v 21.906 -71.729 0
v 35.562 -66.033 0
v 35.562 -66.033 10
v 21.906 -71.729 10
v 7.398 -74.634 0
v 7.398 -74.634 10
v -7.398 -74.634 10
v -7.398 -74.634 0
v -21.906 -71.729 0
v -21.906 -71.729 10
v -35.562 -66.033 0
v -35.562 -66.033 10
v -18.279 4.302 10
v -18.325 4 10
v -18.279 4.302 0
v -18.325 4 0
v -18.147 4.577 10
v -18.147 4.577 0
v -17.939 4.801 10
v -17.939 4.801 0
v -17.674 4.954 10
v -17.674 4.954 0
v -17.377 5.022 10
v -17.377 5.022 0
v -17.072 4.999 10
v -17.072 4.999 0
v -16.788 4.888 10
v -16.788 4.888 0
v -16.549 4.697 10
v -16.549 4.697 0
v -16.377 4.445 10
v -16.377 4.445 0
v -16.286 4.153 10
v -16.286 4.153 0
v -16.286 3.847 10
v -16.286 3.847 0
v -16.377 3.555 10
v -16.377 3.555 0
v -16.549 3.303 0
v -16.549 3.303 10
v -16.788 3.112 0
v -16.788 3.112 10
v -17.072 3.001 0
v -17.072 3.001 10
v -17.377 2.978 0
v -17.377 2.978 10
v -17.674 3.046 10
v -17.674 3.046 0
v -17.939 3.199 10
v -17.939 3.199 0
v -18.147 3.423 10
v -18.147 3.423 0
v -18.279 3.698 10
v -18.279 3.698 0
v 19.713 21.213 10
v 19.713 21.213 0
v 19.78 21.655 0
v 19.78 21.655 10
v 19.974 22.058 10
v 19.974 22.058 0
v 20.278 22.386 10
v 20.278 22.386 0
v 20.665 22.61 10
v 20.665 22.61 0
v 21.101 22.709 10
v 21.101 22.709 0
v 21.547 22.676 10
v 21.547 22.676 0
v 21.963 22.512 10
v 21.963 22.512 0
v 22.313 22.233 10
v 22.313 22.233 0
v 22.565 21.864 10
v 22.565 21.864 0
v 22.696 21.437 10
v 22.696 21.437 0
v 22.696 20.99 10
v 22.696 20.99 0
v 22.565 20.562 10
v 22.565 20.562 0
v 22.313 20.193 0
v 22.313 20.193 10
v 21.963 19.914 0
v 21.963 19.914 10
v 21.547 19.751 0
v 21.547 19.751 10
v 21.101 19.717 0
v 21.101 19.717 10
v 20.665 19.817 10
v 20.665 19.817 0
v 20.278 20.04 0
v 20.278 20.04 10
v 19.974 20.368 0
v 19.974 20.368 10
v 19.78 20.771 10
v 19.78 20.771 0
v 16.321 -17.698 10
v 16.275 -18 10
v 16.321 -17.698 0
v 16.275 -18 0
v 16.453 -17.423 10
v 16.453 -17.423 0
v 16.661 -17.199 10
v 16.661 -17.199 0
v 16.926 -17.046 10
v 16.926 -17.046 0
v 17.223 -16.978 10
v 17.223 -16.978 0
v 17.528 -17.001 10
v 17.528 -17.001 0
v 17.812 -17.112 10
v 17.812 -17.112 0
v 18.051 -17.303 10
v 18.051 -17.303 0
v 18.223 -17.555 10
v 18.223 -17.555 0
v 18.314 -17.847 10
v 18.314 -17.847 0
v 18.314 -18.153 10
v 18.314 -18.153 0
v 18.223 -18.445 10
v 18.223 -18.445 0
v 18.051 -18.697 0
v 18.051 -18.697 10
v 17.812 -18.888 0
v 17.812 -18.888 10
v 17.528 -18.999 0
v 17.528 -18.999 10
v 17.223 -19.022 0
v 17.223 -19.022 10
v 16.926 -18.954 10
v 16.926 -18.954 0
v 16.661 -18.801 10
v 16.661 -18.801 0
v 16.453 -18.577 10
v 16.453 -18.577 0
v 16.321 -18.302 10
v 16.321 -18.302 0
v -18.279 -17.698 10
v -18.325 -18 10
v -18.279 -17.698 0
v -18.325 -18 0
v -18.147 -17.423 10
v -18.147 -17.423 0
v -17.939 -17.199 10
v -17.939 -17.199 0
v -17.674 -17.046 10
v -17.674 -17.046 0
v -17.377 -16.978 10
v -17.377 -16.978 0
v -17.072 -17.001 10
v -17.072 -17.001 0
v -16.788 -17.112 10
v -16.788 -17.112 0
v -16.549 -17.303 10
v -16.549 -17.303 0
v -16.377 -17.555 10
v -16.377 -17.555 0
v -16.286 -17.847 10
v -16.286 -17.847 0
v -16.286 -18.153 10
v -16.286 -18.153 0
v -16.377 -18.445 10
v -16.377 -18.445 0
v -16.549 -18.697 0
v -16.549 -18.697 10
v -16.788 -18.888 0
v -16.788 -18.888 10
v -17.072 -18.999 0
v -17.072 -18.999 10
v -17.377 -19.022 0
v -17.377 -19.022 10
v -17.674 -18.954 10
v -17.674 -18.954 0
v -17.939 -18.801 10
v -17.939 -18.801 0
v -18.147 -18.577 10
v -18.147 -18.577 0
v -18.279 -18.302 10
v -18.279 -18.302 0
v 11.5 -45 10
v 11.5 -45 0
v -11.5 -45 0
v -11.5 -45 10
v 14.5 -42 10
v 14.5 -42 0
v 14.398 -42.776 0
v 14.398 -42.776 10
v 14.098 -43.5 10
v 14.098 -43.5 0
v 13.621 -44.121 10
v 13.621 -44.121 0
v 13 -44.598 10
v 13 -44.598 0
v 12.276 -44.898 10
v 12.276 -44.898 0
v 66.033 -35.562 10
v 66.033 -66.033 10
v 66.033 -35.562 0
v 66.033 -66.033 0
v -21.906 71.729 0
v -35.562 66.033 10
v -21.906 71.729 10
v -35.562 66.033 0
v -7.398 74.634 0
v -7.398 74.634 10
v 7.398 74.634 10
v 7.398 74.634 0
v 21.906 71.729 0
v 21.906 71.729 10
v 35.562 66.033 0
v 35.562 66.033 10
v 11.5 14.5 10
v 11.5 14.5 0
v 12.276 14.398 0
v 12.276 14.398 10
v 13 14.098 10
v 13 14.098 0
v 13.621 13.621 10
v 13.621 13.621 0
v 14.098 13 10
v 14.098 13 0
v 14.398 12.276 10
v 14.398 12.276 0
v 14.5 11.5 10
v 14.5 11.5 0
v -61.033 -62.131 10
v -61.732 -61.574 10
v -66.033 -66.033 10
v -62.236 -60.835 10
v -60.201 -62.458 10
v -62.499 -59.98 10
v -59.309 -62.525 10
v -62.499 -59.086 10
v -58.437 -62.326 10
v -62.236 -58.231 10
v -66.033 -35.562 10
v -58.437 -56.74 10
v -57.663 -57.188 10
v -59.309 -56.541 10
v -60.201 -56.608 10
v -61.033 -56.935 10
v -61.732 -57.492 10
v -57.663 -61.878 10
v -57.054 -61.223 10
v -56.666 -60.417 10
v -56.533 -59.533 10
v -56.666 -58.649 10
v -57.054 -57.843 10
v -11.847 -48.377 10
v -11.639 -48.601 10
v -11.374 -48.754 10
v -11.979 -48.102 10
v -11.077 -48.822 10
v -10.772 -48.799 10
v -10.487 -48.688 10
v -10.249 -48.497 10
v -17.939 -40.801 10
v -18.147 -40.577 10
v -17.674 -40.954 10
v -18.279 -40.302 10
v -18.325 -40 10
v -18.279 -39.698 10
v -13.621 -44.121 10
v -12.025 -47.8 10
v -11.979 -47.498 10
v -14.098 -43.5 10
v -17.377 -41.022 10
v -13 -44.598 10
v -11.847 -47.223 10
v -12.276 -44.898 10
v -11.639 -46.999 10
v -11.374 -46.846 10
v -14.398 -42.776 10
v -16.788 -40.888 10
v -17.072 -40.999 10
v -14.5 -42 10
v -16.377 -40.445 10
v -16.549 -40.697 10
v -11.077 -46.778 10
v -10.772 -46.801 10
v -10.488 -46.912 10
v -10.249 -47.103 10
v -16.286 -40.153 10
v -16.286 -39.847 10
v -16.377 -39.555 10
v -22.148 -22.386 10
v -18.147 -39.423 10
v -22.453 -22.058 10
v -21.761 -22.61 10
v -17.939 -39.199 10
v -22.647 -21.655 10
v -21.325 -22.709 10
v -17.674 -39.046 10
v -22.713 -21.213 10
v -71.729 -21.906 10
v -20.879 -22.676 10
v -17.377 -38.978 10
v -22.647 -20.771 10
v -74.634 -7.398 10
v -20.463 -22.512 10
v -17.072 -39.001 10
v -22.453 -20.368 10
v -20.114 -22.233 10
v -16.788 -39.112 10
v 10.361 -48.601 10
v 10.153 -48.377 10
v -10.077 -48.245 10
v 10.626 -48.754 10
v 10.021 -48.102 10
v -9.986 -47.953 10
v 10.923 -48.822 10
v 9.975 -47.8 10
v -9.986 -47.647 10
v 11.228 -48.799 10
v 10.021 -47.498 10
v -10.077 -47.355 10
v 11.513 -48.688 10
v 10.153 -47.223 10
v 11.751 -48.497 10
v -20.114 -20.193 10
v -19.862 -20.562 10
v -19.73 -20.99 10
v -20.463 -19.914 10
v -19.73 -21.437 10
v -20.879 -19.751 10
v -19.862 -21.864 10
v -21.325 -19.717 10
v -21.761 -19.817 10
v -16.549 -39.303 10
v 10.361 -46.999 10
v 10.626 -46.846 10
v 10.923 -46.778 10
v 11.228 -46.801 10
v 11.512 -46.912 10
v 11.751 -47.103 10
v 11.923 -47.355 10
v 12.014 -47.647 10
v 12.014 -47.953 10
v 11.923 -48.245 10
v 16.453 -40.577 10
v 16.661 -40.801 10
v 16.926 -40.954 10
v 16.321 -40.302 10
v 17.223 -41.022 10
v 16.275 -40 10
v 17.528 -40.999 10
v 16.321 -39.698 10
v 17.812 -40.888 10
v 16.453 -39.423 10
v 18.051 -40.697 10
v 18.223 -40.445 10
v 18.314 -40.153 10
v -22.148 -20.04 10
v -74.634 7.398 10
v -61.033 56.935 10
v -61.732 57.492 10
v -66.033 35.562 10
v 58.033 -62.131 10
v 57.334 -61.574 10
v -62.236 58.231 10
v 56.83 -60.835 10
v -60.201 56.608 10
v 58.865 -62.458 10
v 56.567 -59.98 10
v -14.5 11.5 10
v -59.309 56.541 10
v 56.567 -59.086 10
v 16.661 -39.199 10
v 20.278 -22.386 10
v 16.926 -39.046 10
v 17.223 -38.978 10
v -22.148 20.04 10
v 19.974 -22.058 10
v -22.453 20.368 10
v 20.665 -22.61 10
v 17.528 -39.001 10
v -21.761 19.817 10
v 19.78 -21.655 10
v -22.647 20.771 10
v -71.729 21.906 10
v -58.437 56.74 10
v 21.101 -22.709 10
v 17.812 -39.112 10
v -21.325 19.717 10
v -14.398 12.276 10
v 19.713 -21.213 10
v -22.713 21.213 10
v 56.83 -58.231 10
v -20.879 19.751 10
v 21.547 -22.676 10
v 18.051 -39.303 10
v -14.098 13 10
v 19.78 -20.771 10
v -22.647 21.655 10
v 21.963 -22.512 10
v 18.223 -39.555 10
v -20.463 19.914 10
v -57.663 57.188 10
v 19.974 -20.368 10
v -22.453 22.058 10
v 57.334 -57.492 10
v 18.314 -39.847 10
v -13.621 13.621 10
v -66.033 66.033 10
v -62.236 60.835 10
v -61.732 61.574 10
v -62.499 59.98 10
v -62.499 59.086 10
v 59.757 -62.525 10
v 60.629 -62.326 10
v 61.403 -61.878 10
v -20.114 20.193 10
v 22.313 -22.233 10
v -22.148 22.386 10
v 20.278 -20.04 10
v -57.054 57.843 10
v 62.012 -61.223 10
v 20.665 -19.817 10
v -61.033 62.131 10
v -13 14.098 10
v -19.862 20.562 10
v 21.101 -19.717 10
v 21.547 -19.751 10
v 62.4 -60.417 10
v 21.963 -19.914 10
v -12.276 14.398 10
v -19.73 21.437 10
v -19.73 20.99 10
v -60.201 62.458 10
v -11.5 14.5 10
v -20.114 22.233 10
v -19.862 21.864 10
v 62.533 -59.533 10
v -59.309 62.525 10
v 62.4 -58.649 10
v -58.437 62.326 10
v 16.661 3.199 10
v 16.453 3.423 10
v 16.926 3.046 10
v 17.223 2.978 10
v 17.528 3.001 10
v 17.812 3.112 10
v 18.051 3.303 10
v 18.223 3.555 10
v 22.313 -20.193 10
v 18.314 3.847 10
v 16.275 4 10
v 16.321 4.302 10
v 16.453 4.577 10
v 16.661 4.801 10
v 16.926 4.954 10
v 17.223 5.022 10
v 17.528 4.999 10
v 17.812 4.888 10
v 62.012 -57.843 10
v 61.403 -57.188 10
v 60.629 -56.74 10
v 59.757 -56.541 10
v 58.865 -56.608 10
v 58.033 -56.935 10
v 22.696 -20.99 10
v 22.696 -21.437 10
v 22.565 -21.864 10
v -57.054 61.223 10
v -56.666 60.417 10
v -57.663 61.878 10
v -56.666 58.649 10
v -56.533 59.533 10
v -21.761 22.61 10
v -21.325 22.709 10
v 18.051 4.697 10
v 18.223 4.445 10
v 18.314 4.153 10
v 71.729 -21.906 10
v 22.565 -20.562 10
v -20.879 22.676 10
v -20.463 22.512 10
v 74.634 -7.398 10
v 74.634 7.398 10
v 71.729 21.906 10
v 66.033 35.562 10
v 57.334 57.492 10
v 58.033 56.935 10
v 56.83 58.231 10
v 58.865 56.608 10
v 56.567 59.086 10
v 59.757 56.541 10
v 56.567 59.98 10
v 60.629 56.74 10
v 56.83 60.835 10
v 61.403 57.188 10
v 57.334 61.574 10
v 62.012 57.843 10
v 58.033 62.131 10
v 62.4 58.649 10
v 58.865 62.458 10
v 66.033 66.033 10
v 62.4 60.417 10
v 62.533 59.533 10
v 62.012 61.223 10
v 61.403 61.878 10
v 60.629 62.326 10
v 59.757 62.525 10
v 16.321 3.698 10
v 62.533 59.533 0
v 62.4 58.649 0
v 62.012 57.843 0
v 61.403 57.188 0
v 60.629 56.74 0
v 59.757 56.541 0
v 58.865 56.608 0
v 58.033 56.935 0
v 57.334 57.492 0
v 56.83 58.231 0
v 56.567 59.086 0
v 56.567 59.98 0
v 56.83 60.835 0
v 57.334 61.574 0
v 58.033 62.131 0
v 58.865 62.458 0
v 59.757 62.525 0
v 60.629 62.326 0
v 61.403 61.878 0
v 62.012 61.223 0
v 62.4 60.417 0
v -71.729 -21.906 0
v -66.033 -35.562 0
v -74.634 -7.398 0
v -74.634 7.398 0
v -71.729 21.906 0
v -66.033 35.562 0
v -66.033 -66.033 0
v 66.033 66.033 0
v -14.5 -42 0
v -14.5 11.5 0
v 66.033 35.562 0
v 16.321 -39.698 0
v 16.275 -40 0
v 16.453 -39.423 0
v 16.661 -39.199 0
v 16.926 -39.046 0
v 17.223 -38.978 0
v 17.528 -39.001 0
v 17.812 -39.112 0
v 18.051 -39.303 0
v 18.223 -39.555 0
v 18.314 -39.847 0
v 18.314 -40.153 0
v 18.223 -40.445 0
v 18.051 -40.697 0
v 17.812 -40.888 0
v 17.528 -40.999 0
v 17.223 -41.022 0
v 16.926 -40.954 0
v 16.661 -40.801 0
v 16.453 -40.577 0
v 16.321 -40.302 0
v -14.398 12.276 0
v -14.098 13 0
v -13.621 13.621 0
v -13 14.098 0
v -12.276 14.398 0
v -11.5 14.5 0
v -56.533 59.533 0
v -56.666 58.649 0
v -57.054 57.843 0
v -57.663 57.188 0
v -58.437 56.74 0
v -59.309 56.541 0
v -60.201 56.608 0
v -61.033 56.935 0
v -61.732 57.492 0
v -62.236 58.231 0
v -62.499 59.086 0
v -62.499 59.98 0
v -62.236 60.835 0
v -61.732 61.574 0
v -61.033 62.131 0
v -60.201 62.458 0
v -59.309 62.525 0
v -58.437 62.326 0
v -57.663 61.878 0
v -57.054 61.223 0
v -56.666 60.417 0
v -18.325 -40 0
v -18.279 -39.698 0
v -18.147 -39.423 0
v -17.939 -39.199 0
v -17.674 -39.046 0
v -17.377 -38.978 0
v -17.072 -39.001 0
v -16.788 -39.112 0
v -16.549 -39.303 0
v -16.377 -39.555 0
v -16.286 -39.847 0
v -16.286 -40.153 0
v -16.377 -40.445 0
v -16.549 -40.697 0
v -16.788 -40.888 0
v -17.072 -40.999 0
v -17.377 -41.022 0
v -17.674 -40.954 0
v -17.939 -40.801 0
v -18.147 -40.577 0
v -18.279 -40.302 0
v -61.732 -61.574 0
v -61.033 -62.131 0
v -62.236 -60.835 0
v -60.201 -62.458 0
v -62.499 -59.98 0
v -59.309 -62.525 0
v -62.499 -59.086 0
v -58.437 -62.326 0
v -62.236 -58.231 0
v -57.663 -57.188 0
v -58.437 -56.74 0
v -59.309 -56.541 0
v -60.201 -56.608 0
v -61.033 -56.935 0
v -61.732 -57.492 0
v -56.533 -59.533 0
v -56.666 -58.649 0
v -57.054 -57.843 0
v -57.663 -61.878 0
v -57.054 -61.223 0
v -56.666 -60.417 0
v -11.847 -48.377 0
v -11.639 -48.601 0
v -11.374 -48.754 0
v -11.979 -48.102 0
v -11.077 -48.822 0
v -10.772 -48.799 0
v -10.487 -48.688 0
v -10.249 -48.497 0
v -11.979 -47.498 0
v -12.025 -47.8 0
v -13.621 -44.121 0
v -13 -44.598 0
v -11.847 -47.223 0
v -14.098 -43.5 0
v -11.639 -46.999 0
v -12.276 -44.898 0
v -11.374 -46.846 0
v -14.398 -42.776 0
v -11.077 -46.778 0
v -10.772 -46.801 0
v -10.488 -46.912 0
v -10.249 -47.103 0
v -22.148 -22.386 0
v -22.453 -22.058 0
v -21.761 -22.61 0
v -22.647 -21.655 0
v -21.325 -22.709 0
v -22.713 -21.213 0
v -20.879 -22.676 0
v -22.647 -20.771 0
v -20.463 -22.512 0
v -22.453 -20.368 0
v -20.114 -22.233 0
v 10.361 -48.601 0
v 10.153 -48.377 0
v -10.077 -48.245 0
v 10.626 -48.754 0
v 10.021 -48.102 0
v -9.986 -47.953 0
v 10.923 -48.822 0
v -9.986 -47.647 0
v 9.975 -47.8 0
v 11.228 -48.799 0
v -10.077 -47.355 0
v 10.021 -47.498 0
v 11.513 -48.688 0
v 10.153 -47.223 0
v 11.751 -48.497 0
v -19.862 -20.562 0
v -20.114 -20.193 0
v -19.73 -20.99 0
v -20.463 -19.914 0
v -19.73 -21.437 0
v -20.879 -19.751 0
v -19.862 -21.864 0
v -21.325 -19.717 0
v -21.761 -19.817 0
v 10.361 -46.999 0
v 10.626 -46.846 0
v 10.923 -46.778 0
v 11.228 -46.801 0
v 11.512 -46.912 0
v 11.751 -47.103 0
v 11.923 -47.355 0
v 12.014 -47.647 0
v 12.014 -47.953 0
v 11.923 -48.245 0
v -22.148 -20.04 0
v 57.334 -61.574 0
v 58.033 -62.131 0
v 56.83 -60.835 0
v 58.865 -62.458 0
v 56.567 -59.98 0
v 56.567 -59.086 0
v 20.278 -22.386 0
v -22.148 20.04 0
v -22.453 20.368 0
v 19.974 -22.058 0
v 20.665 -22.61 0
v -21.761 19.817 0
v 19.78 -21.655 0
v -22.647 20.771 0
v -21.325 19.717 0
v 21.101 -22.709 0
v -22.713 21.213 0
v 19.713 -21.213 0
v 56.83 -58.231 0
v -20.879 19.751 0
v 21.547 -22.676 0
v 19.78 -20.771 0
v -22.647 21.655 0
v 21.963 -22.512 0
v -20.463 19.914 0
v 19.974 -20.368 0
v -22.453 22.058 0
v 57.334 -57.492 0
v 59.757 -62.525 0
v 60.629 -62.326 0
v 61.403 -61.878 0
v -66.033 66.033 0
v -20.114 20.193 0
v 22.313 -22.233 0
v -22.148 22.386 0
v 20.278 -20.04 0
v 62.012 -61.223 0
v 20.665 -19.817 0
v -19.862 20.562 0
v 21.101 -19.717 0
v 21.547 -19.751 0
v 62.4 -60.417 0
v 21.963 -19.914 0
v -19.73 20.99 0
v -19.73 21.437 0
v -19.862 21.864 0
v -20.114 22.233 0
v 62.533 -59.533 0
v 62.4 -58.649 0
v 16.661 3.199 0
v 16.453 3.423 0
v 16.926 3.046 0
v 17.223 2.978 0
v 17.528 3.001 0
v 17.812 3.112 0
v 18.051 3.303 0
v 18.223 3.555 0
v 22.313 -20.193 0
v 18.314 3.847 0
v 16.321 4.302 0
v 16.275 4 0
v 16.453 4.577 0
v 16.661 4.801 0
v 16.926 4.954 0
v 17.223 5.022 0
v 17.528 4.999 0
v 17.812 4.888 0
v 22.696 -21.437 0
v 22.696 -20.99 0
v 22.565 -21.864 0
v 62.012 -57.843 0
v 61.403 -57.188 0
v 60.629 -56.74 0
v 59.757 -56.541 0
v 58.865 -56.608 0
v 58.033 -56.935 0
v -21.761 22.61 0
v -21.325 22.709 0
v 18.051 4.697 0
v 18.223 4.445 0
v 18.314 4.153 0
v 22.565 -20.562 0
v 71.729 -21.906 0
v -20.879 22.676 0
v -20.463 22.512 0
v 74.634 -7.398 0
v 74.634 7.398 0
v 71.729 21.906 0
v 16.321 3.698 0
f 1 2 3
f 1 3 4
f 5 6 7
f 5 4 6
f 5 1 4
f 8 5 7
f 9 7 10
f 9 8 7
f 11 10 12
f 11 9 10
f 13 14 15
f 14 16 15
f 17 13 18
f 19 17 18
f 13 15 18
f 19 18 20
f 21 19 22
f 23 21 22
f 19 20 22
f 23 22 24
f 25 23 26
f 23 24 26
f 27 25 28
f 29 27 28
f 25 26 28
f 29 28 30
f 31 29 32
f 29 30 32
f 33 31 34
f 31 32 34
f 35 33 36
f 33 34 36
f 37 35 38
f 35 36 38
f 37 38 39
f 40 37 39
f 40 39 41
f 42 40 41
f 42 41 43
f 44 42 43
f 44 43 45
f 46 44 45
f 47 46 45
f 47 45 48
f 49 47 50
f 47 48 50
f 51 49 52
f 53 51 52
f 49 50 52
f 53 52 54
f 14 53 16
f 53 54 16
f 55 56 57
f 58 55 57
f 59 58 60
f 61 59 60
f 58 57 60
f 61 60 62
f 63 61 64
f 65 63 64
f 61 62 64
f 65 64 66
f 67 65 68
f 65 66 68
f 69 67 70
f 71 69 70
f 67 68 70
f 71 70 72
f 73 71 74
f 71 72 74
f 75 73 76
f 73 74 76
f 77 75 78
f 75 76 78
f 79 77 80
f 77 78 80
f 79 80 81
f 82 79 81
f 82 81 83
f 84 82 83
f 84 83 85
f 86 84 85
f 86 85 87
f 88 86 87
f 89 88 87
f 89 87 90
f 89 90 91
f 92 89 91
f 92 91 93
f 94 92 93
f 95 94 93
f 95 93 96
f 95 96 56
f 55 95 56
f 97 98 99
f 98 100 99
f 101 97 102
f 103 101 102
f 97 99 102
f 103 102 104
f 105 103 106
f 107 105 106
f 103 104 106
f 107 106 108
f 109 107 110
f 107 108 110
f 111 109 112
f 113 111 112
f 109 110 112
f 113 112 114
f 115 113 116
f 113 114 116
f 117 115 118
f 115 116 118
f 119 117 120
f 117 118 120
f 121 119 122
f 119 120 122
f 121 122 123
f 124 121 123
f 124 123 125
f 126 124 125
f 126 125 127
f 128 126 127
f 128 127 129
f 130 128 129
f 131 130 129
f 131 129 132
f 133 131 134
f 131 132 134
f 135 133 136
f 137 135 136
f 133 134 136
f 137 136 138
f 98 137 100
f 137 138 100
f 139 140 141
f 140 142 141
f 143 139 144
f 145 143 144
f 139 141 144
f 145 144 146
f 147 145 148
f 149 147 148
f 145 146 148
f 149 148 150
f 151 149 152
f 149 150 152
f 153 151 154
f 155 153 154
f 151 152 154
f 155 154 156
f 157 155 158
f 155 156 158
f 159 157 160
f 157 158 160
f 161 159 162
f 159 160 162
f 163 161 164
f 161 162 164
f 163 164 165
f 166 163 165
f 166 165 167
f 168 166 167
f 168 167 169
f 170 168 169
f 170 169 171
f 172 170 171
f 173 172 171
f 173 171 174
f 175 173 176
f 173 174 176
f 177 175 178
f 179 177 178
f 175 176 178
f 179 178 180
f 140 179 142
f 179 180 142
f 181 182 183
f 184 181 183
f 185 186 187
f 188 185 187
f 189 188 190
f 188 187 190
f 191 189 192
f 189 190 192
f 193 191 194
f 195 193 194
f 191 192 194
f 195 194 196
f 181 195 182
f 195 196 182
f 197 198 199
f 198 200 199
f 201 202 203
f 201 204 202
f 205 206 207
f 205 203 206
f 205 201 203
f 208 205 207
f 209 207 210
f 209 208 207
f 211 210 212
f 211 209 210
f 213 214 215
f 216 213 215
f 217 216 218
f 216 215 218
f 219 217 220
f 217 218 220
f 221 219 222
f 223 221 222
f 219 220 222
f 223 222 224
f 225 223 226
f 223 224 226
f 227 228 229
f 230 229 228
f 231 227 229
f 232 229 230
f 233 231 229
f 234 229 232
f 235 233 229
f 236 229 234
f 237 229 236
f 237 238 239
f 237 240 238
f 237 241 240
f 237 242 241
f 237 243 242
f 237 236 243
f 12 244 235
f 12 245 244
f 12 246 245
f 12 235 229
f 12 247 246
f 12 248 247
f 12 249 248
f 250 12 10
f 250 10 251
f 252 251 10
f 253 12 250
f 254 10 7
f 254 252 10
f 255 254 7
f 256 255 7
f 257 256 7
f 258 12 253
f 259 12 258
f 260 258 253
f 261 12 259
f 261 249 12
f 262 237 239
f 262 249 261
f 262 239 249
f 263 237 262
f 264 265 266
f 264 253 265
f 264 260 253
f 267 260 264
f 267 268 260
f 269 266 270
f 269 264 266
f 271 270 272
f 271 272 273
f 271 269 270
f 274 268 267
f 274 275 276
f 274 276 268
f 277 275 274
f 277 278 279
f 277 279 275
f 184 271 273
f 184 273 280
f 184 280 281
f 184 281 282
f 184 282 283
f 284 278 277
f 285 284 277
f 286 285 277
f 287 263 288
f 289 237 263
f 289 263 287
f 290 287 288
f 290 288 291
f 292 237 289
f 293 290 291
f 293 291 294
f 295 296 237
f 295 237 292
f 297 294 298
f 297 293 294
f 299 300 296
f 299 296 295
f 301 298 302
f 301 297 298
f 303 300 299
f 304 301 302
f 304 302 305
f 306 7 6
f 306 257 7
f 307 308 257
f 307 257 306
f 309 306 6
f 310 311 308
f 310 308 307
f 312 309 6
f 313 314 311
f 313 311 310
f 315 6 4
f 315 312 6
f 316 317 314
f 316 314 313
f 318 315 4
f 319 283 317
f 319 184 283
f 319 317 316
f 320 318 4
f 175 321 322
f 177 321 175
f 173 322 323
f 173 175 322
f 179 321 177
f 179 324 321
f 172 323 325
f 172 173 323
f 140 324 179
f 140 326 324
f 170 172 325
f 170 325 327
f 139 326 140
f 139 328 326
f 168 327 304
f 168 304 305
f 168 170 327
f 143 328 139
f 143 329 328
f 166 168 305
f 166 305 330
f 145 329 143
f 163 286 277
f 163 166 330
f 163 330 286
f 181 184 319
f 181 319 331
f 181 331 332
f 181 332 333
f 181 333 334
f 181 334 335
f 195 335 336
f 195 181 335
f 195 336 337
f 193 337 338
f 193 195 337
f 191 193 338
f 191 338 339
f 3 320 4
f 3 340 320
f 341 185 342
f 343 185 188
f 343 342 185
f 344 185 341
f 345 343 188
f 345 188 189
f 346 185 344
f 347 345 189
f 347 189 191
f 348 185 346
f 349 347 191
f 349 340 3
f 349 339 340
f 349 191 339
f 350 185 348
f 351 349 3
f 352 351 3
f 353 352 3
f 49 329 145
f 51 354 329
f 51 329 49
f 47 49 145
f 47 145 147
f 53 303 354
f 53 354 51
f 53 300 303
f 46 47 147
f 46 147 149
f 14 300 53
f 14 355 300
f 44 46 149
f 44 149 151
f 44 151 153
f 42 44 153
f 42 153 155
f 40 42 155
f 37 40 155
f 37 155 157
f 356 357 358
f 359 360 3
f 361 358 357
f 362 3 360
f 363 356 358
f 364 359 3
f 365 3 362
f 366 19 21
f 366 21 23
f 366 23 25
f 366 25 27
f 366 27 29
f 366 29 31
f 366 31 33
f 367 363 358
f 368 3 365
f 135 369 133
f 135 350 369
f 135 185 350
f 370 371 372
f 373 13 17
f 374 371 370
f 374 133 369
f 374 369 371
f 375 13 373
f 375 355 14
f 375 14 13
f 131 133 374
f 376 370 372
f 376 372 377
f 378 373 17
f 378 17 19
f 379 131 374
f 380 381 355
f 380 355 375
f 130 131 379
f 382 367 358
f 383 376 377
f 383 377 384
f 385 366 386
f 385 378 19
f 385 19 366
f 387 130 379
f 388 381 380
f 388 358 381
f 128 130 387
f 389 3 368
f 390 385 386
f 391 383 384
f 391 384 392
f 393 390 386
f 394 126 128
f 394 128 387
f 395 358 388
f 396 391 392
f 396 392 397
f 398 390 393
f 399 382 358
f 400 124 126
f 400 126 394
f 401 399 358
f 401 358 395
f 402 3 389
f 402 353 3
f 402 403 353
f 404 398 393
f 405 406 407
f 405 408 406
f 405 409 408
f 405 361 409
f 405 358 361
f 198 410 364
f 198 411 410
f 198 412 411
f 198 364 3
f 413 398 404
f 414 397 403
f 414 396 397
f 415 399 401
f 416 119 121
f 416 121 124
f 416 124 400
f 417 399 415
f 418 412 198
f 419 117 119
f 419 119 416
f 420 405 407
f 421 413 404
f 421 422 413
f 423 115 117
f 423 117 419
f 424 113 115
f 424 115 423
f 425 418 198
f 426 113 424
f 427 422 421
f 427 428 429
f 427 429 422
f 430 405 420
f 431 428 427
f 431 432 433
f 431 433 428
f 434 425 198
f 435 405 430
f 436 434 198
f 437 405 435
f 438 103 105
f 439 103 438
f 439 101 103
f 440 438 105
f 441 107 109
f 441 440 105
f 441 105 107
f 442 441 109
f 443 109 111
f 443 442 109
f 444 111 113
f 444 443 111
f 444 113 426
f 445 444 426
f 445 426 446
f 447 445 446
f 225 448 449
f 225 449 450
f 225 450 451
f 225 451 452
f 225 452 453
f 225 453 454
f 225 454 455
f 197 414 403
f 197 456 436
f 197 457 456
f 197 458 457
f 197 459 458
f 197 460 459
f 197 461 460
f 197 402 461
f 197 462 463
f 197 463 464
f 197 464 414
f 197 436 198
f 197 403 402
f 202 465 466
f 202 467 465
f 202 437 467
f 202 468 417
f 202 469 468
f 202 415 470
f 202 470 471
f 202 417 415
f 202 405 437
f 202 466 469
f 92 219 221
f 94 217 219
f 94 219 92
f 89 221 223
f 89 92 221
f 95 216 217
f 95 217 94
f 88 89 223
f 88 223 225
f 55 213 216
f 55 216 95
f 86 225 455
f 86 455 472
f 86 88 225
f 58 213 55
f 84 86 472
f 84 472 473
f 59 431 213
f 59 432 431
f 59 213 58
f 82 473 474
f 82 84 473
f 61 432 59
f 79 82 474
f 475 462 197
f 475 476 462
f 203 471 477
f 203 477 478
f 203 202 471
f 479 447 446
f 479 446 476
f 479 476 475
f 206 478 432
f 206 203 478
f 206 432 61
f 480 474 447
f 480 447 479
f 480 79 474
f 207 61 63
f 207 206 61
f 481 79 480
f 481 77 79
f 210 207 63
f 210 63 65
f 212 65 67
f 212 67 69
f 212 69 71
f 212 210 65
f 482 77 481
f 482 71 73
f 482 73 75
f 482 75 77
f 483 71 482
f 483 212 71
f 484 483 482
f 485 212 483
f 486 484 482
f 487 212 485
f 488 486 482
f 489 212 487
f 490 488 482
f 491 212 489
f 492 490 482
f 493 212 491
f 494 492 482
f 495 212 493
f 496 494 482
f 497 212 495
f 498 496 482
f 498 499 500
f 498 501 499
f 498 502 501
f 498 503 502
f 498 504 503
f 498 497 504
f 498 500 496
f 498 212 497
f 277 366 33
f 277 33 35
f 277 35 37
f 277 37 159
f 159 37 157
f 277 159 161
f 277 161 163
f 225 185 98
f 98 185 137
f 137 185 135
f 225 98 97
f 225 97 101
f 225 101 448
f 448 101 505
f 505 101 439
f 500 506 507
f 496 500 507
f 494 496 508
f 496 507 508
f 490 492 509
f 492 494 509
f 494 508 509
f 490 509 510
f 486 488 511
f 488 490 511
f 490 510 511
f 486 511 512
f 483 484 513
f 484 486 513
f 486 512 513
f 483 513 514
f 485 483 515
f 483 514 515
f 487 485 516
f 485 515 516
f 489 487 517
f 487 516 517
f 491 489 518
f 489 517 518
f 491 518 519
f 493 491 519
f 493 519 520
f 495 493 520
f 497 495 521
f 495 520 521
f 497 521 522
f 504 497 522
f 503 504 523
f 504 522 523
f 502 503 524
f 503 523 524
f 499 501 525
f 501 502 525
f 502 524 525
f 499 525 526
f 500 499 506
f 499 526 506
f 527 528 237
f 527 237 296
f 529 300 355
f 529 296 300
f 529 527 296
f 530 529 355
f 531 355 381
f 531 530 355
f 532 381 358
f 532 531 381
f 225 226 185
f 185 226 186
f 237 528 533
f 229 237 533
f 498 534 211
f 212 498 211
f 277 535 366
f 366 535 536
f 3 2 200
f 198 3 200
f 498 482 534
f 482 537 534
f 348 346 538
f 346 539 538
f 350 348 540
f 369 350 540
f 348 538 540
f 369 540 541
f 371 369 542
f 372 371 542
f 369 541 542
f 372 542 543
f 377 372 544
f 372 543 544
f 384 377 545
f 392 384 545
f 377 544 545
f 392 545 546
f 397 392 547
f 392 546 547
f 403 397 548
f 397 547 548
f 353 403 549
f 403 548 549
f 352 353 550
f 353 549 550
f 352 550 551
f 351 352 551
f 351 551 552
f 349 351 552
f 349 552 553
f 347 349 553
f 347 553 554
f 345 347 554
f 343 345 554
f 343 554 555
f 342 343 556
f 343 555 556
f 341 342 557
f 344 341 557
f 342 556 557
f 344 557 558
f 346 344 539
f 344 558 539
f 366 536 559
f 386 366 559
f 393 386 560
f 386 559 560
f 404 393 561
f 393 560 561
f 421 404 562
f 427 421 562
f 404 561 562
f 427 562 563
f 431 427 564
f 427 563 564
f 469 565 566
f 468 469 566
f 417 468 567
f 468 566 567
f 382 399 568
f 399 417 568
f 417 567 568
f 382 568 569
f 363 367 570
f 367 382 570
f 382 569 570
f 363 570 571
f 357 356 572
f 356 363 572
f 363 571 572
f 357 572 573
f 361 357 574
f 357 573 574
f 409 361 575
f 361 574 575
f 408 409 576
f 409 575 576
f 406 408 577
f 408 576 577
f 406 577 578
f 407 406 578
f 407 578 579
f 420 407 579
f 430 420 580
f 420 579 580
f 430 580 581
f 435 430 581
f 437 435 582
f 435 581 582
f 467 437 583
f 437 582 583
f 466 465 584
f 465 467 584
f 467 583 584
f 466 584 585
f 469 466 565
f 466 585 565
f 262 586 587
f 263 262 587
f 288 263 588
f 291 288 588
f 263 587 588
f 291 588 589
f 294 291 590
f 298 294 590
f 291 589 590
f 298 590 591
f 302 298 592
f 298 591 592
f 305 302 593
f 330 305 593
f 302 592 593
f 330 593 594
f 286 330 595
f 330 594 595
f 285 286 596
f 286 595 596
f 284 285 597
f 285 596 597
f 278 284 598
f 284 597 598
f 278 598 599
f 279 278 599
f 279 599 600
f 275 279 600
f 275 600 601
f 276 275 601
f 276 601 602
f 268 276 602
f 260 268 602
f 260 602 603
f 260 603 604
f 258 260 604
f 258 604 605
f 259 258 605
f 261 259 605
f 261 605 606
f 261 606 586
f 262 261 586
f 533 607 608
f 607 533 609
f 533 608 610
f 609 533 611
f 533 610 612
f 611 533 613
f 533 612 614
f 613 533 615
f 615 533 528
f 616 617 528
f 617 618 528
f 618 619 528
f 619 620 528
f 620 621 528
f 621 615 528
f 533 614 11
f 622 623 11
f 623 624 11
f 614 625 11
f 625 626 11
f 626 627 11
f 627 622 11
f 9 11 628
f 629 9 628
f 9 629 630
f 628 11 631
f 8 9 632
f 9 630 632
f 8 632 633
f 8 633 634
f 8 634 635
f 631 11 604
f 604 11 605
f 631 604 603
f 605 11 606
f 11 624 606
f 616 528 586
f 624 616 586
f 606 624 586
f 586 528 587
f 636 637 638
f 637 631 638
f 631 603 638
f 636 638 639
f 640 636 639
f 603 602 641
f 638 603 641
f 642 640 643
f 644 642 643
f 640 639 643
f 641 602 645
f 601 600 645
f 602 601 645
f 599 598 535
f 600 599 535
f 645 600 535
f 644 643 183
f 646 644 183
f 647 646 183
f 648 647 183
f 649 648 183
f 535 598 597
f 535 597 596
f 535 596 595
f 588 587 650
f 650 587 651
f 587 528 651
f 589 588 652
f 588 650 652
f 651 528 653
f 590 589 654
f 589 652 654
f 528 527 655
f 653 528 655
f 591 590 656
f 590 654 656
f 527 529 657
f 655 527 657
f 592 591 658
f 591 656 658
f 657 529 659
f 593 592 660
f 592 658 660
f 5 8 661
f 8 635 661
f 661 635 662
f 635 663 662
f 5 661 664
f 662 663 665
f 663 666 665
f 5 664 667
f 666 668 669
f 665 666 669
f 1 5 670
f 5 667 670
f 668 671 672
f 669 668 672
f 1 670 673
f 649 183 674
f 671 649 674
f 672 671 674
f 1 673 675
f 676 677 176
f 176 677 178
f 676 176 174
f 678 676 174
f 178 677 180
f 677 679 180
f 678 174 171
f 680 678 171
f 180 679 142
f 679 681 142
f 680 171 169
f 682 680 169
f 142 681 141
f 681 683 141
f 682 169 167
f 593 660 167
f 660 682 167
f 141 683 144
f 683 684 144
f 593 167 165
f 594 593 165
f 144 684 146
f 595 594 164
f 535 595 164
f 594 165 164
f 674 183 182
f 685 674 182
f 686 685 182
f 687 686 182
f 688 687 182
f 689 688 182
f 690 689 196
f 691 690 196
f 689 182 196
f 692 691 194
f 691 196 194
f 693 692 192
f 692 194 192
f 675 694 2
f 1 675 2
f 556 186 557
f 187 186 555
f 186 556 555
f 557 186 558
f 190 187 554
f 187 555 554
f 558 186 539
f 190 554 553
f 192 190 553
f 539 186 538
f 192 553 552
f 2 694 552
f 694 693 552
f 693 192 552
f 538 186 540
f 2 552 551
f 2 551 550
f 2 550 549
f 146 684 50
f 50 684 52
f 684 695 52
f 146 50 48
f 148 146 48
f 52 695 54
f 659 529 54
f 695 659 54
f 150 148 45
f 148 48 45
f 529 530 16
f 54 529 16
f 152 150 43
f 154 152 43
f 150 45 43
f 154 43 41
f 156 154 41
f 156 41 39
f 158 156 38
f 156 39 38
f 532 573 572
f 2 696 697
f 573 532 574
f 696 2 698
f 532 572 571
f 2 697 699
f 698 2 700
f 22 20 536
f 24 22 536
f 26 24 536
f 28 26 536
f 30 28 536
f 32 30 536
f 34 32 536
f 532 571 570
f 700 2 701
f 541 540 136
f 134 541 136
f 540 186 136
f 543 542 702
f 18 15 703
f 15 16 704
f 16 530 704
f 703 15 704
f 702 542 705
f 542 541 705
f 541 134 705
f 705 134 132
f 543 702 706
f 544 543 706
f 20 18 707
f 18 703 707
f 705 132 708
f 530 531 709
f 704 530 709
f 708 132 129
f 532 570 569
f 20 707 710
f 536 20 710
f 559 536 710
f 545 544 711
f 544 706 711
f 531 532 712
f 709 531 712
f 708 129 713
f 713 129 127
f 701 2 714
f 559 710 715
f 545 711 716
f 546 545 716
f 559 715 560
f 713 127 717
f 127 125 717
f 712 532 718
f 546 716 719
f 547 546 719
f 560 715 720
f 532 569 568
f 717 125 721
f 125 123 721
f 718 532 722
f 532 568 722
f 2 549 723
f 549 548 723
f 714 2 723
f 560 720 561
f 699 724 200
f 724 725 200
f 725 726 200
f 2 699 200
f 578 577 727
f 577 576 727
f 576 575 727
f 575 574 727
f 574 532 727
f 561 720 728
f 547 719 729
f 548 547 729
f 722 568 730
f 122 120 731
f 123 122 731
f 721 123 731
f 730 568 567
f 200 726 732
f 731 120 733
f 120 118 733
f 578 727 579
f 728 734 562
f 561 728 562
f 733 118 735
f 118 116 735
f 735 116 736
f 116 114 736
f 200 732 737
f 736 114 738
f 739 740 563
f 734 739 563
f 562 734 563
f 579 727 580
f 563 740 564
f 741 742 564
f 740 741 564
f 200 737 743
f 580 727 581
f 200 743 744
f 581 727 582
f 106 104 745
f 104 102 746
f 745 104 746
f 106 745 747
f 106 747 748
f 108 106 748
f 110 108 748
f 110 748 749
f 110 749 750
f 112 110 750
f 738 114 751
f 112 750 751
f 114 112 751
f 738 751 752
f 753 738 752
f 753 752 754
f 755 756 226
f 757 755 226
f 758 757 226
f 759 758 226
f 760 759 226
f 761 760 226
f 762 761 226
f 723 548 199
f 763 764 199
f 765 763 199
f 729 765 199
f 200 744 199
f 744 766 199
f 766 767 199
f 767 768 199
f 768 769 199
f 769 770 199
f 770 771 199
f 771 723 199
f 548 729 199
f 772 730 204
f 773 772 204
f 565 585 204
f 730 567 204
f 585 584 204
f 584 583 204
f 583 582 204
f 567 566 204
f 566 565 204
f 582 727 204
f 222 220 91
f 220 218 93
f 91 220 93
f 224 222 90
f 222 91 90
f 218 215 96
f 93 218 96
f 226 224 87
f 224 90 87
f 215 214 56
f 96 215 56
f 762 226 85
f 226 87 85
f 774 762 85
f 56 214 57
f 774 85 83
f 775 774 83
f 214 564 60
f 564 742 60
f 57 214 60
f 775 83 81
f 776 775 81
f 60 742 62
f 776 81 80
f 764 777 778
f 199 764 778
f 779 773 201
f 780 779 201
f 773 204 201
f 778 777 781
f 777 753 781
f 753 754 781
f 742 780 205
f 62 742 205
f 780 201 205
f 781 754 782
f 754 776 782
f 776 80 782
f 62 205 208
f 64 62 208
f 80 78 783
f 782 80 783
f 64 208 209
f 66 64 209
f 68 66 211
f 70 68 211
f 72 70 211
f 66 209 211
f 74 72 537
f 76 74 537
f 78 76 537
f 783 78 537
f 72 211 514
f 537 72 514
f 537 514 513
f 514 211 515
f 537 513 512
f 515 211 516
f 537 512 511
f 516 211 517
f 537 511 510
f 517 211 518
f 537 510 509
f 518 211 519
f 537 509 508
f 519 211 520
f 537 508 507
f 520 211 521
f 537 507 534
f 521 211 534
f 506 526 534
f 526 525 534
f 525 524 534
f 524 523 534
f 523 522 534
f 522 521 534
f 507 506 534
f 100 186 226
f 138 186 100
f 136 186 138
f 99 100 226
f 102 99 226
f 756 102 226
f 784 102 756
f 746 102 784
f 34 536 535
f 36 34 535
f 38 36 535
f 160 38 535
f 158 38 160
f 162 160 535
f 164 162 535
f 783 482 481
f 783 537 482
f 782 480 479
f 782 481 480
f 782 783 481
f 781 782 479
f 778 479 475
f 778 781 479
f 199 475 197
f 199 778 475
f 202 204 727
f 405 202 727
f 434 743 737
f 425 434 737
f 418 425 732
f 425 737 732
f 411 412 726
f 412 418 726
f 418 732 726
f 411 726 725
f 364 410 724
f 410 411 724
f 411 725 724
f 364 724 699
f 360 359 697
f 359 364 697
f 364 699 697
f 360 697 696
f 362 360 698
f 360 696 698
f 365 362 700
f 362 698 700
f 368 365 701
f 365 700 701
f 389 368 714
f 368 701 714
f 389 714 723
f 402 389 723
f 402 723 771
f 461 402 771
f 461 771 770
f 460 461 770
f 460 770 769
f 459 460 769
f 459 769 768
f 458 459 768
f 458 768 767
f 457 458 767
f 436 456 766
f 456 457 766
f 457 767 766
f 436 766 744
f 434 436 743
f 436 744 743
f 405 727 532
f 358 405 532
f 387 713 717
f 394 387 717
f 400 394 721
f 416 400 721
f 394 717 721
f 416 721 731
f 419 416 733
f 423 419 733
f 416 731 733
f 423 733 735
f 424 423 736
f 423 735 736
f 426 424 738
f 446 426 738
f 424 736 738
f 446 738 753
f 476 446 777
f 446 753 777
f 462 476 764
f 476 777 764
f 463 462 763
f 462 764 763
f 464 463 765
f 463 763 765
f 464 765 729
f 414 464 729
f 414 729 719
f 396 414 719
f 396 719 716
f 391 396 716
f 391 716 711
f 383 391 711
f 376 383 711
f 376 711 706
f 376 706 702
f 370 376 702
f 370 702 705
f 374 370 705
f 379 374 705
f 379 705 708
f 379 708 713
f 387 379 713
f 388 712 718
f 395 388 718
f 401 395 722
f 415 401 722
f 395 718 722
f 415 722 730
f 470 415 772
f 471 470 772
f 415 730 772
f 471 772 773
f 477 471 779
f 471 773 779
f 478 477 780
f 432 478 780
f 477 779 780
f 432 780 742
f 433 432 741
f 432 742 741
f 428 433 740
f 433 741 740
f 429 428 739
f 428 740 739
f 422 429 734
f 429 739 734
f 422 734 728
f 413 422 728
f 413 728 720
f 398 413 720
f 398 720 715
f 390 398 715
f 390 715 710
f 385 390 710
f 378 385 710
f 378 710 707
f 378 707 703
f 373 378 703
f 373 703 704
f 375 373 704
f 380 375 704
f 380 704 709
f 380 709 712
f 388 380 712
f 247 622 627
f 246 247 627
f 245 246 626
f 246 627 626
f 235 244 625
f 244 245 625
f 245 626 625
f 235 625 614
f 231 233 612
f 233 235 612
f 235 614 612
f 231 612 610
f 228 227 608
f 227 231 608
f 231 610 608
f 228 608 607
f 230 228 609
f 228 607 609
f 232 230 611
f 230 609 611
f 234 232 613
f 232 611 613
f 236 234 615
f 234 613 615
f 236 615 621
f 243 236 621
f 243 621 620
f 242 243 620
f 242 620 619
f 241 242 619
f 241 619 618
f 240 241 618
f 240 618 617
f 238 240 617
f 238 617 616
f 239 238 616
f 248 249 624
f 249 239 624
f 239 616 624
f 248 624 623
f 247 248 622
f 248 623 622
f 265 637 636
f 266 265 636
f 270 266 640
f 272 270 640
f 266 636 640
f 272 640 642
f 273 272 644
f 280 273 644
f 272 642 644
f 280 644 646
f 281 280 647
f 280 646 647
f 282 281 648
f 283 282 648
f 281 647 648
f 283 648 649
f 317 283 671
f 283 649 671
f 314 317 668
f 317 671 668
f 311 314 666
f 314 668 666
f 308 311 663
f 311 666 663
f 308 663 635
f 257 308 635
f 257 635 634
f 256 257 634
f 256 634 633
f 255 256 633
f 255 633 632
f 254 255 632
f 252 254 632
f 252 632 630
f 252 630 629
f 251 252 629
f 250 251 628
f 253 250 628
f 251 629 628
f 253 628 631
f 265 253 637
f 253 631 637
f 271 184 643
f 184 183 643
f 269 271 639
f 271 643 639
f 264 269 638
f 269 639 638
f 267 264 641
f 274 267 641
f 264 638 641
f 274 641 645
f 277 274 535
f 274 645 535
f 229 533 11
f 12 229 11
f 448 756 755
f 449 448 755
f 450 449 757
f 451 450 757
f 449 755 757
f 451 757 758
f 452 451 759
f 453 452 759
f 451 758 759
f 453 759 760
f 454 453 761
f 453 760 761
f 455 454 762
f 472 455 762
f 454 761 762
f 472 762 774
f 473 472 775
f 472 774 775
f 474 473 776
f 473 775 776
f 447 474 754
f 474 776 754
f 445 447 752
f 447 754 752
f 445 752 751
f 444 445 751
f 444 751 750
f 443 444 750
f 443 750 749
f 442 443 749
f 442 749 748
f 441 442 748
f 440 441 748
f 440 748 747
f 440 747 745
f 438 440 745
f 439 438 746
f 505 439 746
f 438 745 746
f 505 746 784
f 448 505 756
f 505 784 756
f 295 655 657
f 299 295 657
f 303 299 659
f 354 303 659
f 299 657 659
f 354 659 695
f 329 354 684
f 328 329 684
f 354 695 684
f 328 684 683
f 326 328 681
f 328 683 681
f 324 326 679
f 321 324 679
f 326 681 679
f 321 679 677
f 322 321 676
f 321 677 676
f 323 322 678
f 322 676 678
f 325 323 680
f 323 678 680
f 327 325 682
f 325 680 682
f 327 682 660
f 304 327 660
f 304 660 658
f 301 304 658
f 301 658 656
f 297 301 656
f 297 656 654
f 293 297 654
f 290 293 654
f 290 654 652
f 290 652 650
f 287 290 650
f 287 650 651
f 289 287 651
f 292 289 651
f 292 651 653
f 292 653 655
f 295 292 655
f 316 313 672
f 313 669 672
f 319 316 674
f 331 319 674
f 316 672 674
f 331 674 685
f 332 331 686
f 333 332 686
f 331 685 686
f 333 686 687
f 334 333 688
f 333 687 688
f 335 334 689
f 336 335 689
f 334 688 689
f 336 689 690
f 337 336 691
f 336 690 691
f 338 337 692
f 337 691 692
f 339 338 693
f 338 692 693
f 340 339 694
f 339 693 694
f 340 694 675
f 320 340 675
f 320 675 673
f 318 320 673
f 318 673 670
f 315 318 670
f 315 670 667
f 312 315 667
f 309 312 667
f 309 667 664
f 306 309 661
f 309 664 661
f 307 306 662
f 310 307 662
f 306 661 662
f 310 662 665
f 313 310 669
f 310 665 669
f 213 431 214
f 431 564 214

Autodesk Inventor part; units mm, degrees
ref_plane "YZ Plane" through (0, 0, 0) normal (1, 0, 0) x (0, 1, 0)
ref_plane "XZ Plane" through (0, 0, 0) normal (0, 1, 0) x (-1, 0, 0)
ref_plane "XY Plane" through (0, 0, 0) normal (0, 0, 1) x (1, 0, 0)
sketch "Эскиз1" plane through (0, 0, 0) normal (0, 0, 1) x (1, 0, 0)
  circle A0 centre (59.533, -59.533) radius 3 projected
  circle A1 centre (-59.533, -59.533) radius 3 projected
  circle A2 centre (-59.533, 59.533) radius 3 projected
  circle A3 centre (59.533, 59.533) radius 3 projected
  circle A4 centre (0, 0) radius 65 projected
  arc A5 (35.5618, 66.033) -> (-35.5618, 66.033) centre (0, 0) ccw projected
  line L0 (-35.5618, 66.033) -> (-66.033, 66.033) projected
  line L1 (-66.033, 66.033) -> (-66.033, 35.5618) projected
  arc A6 (-66.033, 35.5618) -> (-66.033, -35.5618) centre (0, 0) ccw projected
  line L2 (-66.033, -35.5618) -> (-66.033, -66.033) projected
  line L3 (-66.033, -66.033) -> (-35.5618, -66.033) projected
  arc A7 (-35.5618, -66.033) -> (35.5618, -66.033) centre (0, 0) ccw projected
  line L4 (35.5618, -66.033) -> (66.033, -66.033) projected
  line L5 (66.033, -66.033) -> (66.033, -35.5618) projected
  arc A8 (66.033, -35.5618) -> (66.033, 35.5618) centre (0, 0) ccw projected
  line L6 (66.033, 35.5618) -> (66.033, 66.033) projected
  line L7 (66.033, 66.033) -> (35.5618, 66.033) projected
  point P0 (0, 0)
extrude "Выдавливание1" add sketch "Эскиз1" along normal blind 10 contours A4 | L7 L6 A8 L5 L4 A7 L3 L2 A6 L1 L0 A5
sketch "Эскиз8" plane through (0, 0, 0) normal (0, 0, -1) x (-1, 0, 0)
  arc A0 (-18, 26.5) -> (-26.5, 18) centre (-18, 18) ccw
  line L0 (-26.5, -18) -> (-26.5, 18)
  arc A1 (-26.5, -18) -> (-18, -26.5) centre (-18, -18) ccw
  line L1 (18, -26.5) -> (-18, -26.5)
  arc A2 (18, -26.5) -> (26.5, -18) centre (18, -18) ccw
  line L2 (26.5, 18) -> (26.5, -18)
  arc A3 (26.5, 18) -> (18, 26.5) centre (18, 18) ccw
  line L3 (-18, 26.5) -> (18, 26.5)
  circle A4 centre (-21.2132, 21.2132) radius 1.5
  circle A5 centre (-21.2132, -21.2132) radius 1.5
  circle A6 centre (21.2132, -21.2132) radius 1.5
  circle A7 centre (21.2132, 21.2132) radius 1.5
  circle A8 centre (0, 0) radius 22
extrude "Выдавливание6" cut sketch "Эскиз8" against normal blind 10 contours A4 | A5 | A6 | A7
sketch "Эскиз9" plane through (0, 0, 0) normal (0, 0, -1) x (-1, 0, 0)
  line L0 (20.1, -44.6) -> (20.1, 8.5)
  line L1 (20.1, 8.5) -> (15, 14.5)
  line L2 (11.5, 14.5) -> (15, 14.5)
  line L3 (11.5, 14.5) -> (-11.5, 14.5)
  line L4 (-15, 14.5) -> (-11.5, 14.5)
  line L5 (-15, 14.5) -> (-20.1, 8.5)
  line L6 (-20.1, 8.5) -> (-20.1, -44.6)
  line L7 (-20.1, -44.6) -> (-15, -50.6)
  line L8 (-15, -50.6) -> (15, -50.6)
  line L9 (15, -50.6) -> (20.1, -44.6)
  circle A0 centre (11, -47.8) radius 1.025
  circle A1 centre (-11, -47.8) radius 1.025
  circle A2 centre (-17.3, -40) radius 1.025
  circle A3 centre (17.3, -40) radius 1.025
  circle A4 centre (17.3, -18) radius 1.025
  circle A5 centre (17.3, 4) radius 1.025
  circle A6 centre (-17.3, 4) radius 1.025
  circle A7 centre (0, 0) radius 1.55
  circle A8 centre (0, 0) radius 14
  line L10 (-14.5, 11.5) -> (-14.5, -42)
  arc A9 (-11.5, 14.5) -> (-14.5, 11.5) centre (-11.5, 11.5) ccw
  arc A10 (-14.5, -42) -> (-11.5, -45) centre (-11.5, -42) ccw
  line L11 (-20.1, 8.5) -> (-20.1, -44.6)
  arc A11 (14.5, 11.5) -> (11.5, 14.5) centre (11.5, 11.5) ccw
  line L12 (14.5, -42) -> (14.5, 11.5)
  arc A12 (11.5, -45) -> (14.5, -42) centre (11.5, -42) ccw
  line L13 (-11.5, -45) -> (11.5, -45)
  circle A13 centre (-17.3, -18) radius 1.025
extrude "Выдавливание7" cut sketch "Эскиз9" against normal blind 20.75 contours A11 L12 A12 L13 A10 L10 A9 L3 | A0 | A1 | A2 | A3 | A4 | A5 | A6 | A7 | A8 | A13
properties part number "000.202 - Крышка" material "Пластик АБС"
